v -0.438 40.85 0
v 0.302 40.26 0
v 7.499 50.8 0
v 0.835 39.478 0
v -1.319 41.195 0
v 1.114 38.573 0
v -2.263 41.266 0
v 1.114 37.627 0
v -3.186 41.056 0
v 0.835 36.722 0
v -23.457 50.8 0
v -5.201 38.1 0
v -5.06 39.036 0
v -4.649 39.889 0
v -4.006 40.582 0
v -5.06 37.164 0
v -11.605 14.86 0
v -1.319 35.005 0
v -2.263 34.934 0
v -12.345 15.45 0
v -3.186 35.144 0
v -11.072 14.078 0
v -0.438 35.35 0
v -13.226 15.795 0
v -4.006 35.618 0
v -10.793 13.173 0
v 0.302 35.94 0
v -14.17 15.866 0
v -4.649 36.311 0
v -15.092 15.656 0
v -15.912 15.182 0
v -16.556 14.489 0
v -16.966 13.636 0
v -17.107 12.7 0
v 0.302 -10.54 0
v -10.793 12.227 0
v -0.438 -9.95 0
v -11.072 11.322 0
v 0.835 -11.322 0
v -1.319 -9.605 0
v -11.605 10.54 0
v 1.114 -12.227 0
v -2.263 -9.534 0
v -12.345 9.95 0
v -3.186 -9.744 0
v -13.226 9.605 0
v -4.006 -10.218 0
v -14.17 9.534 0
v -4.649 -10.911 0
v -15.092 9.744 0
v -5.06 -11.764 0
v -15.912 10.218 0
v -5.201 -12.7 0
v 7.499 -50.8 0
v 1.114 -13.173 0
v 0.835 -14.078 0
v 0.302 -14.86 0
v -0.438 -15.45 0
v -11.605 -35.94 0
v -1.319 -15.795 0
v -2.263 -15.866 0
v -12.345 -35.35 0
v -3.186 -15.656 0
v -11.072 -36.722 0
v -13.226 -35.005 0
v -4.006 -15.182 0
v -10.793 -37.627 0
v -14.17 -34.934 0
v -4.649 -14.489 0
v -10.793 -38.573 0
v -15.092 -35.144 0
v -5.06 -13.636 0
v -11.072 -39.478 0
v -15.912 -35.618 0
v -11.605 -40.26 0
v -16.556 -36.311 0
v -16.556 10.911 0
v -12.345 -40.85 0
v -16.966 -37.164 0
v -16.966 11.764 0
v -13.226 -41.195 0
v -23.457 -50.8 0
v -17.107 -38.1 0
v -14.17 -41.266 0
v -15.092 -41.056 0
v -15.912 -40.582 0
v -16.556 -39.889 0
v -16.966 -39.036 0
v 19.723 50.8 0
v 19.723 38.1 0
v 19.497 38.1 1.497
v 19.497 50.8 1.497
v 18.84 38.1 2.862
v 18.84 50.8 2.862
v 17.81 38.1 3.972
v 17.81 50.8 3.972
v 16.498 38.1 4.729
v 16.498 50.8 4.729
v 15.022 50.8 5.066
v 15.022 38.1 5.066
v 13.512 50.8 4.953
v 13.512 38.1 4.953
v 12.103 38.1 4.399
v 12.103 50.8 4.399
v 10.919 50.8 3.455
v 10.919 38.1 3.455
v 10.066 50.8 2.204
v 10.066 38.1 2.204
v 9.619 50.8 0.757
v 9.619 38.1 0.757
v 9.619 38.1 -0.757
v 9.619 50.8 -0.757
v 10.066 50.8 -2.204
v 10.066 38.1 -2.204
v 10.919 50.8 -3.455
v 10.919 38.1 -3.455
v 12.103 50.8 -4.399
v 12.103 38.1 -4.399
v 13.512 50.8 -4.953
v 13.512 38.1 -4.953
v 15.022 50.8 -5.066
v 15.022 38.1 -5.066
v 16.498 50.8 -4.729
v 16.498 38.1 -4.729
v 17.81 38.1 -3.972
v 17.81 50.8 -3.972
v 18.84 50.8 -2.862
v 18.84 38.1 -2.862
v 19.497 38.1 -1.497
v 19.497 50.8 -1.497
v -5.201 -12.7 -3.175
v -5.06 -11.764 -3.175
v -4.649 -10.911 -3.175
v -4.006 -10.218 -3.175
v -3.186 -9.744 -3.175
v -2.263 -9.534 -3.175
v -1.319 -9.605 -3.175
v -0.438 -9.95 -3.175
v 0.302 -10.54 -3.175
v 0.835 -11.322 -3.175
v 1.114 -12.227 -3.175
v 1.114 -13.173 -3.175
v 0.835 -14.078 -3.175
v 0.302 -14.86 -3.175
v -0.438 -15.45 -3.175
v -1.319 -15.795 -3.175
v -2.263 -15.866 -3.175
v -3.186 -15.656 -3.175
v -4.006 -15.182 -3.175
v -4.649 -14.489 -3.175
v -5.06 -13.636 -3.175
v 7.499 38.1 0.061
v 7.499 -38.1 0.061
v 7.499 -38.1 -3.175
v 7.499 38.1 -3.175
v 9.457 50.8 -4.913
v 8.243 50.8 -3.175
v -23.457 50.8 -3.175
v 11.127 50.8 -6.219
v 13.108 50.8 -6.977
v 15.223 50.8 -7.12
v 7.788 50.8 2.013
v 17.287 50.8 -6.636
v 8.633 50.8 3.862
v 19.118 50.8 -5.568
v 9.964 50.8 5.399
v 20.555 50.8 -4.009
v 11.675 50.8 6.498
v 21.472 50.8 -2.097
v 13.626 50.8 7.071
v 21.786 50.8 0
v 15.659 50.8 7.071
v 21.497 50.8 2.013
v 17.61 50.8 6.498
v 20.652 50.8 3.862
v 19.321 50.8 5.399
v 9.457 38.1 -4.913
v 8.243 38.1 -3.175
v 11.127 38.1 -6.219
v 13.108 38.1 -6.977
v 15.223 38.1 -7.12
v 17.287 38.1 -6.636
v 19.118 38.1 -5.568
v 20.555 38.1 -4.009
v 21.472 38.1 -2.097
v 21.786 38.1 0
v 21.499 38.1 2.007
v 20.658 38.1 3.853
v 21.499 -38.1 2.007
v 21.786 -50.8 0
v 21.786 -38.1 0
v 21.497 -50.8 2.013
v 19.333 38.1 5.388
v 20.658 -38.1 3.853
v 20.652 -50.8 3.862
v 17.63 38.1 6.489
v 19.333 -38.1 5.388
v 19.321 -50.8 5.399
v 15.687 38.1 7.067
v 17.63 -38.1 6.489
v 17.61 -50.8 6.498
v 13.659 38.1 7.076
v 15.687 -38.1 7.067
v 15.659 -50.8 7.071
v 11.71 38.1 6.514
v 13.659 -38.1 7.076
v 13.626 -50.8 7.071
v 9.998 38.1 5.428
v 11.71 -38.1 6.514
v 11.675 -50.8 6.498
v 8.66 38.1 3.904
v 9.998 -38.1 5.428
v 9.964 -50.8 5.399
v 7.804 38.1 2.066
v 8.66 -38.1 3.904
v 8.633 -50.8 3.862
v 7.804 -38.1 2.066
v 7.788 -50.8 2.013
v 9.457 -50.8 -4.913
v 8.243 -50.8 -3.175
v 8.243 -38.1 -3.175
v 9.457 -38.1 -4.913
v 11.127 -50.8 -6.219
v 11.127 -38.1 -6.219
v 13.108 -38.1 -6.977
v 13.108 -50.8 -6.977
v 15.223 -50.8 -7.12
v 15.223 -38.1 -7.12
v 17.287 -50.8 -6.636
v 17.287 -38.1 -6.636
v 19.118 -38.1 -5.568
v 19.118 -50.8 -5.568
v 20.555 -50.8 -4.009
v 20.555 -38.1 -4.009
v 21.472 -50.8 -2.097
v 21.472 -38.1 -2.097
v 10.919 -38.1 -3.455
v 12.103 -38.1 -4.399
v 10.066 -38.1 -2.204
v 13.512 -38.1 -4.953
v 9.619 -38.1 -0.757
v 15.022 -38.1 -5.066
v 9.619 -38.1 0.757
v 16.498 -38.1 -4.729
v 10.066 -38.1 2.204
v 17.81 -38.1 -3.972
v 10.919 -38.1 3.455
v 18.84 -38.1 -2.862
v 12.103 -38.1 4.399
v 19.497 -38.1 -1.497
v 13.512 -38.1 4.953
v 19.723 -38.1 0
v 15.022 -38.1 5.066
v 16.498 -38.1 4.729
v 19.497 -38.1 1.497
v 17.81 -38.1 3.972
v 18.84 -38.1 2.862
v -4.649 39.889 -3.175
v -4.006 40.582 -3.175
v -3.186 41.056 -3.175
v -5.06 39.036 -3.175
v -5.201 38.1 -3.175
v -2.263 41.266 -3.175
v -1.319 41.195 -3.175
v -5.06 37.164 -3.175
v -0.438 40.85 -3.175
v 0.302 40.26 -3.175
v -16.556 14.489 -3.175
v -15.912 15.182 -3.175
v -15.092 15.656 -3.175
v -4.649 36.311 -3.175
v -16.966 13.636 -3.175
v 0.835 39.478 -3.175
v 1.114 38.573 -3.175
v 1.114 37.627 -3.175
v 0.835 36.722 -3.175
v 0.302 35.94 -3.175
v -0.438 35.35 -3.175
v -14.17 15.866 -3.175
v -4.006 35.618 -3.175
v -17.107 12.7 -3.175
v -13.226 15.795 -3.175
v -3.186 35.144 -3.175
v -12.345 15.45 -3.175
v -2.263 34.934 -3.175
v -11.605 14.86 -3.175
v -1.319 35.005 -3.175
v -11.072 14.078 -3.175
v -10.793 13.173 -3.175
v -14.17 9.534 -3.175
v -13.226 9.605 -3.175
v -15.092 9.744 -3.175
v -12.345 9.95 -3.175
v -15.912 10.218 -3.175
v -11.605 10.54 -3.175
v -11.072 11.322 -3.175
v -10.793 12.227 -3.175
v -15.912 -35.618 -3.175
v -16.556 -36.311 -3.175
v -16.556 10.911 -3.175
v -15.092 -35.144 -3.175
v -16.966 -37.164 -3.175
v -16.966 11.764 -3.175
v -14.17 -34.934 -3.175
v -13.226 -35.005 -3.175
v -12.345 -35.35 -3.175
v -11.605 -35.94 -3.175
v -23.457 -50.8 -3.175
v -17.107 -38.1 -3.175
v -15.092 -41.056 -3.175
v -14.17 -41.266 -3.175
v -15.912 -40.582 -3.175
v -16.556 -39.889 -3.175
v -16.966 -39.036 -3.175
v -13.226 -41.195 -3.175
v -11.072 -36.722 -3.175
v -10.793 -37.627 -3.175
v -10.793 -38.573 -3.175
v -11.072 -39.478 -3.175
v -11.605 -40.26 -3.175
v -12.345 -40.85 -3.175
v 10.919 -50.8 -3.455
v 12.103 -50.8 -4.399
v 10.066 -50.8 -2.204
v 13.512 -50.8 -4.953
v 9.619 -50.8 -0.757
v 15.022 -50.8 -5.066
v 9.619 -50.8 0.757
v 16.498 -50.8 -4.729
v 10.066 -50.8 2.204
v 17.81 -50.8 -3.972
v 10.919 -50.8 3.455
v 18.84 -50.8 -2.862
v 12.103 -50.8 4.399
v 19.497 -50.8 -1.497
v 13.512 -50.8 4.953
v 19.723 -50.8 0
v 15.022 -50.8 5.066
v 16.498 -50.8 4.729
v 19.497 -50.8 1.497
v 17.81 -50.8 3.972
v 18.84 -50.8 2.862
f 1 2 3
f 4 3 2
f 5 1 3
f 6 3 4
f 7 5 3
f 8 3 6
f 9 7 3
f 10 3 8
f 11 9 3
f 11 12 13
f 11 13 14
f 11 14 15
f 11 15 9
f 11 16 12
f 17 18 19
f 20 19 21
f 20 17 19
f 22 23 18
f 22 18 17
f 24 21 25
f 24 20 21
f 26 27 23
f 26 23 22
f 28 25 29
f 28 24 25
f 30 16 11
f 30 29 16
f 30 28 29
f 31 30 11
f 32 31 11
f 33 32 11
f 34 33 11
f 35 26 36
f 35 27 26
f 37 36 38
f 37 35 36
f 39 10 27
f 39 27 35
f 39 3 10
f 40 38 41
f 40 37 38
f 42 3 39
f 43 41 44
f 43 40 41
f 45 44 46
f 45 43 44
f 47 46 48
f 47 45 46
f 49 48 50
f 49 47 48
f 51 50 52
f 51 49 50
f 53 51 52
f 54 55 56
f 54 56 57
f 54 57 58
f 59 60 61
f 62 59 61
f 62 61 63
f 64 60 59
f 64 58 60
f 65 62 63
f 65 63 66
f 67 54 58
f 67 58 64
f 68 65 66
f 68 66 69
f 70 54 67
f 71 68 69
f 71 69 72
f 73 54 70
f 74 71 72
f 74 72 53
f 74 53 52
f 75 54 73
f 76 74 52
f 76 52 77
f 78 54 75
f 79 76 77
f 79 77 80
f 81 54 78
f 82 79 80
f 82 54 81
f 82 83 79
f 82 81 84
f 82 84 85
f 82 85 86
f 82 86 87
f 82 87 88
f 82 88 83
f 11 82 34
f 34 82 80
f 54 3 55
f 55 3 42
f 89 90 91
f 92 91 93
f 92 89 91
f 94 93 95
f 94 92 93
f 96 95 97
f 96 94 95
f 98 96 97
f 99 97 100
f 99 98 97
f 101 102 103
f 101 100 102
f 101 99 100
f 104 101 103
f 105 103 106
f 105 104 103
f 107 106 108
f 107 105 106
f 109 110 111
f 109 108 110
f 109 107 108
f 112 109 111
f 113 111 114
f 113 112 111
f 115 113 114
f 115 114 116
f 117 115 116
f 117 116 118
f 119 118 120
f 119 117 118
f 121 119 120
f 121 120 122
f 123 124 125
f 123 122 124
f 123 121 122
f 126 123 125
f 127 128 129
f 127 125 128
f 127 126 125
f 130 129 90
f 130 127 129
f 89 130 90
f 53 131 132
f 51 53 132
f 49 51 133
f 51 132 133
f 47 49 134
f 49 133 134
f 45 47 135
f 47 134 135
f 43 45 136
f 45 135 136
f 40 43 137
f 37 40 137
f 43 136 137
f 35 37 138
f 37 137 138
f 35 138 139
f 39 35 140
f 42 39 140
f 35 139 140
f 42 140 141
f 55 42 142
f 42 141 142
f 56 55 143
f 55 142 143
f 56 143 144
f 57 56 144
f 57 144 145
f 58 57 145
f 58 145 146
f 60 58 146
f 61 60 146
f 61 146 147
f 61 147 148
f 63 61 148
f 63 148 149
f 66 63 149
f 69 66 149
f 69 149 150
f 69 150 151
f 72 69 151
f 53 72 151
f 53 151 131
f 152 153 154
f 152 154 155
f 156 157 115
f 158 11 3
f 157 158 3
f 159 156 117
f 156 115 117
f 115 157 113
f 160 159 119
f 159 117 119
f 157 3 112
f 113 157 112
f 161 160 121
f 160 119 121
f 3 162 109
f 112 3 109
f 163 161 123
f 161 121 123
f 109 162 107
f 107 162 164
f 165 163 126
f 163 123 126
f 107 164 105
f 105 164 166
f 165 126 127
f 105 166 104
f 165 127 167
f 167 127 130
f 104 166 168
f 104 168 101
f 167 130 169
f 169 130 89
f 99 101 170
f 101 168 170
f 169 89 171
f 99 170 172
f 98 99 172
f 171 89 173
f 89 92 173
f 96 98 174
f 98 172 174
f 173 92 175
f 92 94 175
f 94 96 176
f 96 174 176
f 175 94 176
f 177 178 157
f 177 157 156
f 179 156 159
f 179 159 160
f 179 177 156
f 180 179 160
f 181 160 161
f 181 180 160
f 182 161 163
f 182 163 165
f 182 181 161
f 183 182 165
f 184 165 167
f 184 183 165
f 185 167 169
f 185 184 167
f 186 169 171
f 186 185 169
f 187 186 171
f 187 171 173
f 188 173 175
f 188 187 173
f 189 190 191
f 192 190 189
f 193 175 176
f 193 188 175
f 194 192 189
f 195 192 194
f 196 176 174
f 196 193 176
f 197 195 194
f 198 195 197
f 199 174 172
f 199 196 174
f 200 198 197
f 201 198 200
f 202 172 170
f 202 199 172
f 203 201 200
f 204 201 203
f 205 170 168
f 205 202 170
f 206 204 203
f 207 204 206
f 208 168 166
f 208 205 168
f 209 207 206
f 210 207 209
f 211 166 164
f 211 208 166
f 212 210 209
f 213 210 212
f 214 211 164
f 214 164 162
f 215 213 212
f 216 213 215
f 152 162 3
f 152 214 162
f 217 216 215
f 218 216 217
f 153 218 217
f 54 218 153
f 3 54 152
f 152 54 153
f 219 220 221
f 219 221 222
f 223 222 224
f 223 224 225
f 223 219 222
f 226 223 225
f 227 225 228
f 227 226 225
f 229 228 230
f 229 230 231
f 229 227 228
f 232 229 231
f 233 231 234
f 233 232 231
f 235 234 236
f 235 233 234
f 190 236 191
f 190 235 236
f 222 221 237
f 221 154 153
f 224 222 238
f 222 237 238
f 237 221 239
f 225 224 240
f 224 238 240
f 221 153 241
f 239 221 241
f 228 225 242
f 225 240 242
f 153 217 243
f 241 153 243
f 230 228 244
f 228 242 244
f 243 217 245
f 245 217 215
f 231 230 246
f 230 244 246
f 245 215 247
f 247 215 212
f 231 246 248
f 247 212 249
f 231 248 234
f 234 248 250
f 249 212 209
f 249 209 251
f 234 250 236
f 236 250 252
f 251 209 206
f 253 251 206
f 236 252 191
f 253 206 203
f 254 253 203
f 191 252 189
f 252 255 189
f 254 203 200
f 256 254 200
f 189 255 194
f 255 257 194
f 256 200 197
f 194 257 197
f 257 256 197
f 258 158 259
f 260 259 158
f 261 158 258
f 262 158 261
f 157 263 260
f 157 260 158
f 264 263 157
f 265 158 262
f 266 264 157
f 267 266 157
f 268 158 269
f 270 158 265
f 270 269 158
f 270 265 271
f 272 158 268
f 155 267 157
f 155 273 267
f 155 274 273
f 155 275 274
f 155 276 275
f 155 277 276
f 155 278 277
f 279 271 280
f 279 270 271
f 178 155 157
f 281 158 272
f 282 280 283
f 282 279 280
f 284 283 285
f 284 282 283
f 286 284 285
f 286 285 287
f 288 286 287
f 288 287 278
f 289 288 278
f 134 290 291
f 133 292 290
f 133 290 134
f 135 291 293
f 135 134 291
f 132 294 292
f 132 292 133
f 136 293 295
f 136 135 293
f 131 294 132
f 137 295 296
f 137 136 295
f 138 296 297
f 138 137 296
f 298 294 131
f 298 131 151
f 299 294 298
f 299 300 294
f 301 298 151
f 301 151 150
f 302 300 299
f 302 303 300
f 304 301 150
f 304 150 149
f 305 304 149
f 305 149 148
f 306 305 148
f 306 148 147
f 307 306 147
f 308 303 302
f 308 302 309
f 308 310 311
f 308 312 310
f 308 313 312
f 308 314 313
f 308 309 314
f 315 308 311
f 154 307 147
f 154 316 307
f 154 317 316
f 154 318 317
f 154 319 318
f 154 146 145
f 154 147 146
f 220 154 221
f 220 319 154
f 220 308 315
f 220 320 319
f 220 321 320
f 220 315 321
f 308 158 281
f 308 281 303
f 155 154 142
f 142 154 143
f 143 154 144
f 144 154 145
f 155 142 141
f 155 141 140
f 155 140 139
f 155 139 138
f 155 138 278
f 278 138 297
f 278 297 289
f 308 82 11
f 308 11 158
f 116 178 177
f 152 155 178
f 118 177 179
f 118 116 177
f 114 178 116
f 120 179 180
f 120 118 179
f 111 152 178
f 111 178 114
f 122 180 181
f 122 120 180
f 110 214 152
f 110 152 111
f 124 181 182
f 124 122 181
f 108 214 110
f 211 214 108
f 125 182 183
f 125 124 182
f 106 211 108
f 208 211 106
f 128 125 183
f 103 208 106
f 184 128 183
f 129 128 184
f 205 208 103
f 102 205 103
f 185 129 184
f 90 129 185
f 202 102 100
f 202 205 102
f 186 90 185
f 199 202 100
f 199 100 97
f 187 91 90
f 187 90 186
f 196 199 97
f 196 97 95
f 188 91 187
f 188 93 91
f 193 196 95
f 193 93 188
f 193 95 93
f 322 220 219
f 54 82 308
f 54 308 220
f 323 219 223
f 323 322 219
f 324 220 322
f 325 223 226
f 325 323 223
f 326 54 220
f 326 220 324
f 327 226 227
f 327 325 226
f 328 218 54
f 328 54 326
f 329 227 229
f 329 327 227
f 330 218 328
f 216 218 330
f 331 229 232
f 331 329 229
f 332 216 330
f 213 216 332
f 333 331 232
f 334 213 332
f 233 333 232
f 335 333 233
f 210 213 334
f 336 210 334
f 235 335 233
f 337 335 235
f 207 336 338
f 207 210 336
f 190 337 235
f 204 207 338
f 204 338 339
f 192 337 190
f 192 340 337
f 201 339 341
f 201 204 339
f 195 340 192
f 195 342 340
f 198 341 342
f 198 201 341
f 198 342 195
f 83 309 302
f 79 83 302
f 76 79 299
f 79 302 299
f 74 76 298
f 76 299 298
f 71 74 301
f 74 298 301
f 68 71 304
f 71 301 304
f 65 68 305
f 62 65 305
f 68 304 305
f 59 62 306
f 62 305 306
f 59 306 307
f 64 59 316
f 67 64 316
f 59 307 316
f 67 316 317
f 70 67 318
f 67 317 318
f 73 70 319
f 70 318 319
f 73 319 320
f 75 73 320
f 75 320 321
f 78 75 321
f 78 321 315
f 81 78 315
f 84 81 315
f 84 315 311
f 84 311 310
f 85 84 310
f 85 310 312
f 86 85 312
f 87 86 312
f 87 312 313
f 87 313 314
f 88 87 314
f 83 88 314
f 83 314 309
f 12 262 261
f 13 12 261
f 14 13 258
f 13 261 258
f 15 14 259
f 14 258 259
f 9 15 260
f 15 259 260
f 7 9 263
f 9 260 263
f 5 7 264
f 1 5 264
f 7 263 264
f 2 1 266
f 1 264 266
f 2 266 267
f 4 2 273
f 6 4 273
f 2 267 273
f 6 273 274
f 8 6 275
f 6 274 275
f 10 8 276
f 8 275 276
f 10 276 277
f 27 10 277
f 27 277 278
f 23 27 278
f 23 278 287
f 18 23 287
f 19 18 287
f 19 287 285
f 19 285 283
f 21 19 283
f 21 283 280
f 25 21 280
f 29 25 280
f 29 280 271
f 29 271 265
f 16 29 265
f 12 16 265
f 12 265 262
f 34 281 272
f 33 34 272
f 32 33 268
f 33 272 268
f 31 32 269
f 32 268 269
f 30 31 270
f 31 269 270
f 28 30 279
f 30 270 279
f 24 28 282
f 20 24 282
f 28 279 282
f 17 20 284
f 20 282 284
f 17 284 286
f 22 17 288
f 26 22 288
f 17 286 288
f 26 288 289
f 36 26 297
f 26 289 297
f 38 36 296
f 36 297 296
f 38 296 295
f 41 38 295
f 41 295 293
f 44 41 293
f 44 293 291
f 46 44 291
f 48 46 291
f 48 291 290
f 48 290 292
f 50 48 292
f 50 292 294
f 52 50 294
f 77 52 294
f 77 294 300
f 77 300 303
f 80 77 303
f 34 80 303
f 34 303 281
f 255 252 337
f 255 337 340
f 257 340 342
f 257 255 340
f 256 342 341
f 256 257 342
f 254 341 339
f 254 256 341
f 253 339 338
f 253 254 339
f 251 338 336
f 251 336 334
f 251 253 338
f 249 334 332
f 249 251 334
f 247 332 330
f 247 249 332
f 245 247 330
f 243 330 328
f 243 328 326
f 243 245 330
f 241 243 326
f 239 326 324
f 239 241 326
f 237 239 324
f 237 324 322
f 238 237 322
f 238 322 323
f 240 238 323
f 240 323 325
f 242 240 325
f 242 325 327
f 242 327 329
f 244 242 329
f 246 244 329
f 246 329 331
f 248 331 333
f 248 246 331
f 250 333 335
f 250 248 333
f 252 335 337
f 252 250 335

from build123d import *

# Parameters (mm, degrees)
F0_R     = 5.08
F1_DEPTH = 50.8
F2_W     = 15.457089
F2_H     = 76.2
F3_DEPTH = 12.7
F5_D     = 6.35


with BuildPart() as f1:
    # F0 (on Front) → F1 (new body, symmetric)
    with BuildSketch(Plane.XZ):
        with BuildLine():
            ThreePointArc((8.24314, -3.175), (7.687379, -1.630541), (7.498807, 0))
            Line((7.498807, 0), (-23.457443, 0))
            Line((-23.457443, 0), (-23.457443, -3.175))
            Line((-23.457443, -3.175), (8.24314, -3.175))
        make_face()
        with BuildLine():
            ThreePointArc((8.24314, -3.175), (16.273098, -6.955178), (21.786307, 0))
            ThreePointArc((21.786307, 0), (14.642557, 7.14375), (7.498807, 0))
            ThreePointArc((7.498807, 0), (7.687379, -1.630541), (8.24314, -3.175))
        make_face()
        with Locations((14.642557, 0)):
            Circle(F0_R, mode=Mode.SUBTRACT)
    extrude(amount=F1_DEPTH, both=True)

    # F2 (on Top) → F3 (cut, symmetric)
    with BuildSketch(Plane.XY):
        with Locations((15.227614, 0)):
            Rectangle(F2_W, F2_H)
    extrude(amount=F3_DEPTH, both=True, mode=Mode.SUBTRACT)

    # F5 (through all)
    with Locations(Plane.XY):
        with Locations((-2.02593, 38.1), (-13.932443, 12.7), (-2.02593, -12.7), (-13.932443, -38.1)):
            Hole(F5_D / 2)


solid = f1.part
